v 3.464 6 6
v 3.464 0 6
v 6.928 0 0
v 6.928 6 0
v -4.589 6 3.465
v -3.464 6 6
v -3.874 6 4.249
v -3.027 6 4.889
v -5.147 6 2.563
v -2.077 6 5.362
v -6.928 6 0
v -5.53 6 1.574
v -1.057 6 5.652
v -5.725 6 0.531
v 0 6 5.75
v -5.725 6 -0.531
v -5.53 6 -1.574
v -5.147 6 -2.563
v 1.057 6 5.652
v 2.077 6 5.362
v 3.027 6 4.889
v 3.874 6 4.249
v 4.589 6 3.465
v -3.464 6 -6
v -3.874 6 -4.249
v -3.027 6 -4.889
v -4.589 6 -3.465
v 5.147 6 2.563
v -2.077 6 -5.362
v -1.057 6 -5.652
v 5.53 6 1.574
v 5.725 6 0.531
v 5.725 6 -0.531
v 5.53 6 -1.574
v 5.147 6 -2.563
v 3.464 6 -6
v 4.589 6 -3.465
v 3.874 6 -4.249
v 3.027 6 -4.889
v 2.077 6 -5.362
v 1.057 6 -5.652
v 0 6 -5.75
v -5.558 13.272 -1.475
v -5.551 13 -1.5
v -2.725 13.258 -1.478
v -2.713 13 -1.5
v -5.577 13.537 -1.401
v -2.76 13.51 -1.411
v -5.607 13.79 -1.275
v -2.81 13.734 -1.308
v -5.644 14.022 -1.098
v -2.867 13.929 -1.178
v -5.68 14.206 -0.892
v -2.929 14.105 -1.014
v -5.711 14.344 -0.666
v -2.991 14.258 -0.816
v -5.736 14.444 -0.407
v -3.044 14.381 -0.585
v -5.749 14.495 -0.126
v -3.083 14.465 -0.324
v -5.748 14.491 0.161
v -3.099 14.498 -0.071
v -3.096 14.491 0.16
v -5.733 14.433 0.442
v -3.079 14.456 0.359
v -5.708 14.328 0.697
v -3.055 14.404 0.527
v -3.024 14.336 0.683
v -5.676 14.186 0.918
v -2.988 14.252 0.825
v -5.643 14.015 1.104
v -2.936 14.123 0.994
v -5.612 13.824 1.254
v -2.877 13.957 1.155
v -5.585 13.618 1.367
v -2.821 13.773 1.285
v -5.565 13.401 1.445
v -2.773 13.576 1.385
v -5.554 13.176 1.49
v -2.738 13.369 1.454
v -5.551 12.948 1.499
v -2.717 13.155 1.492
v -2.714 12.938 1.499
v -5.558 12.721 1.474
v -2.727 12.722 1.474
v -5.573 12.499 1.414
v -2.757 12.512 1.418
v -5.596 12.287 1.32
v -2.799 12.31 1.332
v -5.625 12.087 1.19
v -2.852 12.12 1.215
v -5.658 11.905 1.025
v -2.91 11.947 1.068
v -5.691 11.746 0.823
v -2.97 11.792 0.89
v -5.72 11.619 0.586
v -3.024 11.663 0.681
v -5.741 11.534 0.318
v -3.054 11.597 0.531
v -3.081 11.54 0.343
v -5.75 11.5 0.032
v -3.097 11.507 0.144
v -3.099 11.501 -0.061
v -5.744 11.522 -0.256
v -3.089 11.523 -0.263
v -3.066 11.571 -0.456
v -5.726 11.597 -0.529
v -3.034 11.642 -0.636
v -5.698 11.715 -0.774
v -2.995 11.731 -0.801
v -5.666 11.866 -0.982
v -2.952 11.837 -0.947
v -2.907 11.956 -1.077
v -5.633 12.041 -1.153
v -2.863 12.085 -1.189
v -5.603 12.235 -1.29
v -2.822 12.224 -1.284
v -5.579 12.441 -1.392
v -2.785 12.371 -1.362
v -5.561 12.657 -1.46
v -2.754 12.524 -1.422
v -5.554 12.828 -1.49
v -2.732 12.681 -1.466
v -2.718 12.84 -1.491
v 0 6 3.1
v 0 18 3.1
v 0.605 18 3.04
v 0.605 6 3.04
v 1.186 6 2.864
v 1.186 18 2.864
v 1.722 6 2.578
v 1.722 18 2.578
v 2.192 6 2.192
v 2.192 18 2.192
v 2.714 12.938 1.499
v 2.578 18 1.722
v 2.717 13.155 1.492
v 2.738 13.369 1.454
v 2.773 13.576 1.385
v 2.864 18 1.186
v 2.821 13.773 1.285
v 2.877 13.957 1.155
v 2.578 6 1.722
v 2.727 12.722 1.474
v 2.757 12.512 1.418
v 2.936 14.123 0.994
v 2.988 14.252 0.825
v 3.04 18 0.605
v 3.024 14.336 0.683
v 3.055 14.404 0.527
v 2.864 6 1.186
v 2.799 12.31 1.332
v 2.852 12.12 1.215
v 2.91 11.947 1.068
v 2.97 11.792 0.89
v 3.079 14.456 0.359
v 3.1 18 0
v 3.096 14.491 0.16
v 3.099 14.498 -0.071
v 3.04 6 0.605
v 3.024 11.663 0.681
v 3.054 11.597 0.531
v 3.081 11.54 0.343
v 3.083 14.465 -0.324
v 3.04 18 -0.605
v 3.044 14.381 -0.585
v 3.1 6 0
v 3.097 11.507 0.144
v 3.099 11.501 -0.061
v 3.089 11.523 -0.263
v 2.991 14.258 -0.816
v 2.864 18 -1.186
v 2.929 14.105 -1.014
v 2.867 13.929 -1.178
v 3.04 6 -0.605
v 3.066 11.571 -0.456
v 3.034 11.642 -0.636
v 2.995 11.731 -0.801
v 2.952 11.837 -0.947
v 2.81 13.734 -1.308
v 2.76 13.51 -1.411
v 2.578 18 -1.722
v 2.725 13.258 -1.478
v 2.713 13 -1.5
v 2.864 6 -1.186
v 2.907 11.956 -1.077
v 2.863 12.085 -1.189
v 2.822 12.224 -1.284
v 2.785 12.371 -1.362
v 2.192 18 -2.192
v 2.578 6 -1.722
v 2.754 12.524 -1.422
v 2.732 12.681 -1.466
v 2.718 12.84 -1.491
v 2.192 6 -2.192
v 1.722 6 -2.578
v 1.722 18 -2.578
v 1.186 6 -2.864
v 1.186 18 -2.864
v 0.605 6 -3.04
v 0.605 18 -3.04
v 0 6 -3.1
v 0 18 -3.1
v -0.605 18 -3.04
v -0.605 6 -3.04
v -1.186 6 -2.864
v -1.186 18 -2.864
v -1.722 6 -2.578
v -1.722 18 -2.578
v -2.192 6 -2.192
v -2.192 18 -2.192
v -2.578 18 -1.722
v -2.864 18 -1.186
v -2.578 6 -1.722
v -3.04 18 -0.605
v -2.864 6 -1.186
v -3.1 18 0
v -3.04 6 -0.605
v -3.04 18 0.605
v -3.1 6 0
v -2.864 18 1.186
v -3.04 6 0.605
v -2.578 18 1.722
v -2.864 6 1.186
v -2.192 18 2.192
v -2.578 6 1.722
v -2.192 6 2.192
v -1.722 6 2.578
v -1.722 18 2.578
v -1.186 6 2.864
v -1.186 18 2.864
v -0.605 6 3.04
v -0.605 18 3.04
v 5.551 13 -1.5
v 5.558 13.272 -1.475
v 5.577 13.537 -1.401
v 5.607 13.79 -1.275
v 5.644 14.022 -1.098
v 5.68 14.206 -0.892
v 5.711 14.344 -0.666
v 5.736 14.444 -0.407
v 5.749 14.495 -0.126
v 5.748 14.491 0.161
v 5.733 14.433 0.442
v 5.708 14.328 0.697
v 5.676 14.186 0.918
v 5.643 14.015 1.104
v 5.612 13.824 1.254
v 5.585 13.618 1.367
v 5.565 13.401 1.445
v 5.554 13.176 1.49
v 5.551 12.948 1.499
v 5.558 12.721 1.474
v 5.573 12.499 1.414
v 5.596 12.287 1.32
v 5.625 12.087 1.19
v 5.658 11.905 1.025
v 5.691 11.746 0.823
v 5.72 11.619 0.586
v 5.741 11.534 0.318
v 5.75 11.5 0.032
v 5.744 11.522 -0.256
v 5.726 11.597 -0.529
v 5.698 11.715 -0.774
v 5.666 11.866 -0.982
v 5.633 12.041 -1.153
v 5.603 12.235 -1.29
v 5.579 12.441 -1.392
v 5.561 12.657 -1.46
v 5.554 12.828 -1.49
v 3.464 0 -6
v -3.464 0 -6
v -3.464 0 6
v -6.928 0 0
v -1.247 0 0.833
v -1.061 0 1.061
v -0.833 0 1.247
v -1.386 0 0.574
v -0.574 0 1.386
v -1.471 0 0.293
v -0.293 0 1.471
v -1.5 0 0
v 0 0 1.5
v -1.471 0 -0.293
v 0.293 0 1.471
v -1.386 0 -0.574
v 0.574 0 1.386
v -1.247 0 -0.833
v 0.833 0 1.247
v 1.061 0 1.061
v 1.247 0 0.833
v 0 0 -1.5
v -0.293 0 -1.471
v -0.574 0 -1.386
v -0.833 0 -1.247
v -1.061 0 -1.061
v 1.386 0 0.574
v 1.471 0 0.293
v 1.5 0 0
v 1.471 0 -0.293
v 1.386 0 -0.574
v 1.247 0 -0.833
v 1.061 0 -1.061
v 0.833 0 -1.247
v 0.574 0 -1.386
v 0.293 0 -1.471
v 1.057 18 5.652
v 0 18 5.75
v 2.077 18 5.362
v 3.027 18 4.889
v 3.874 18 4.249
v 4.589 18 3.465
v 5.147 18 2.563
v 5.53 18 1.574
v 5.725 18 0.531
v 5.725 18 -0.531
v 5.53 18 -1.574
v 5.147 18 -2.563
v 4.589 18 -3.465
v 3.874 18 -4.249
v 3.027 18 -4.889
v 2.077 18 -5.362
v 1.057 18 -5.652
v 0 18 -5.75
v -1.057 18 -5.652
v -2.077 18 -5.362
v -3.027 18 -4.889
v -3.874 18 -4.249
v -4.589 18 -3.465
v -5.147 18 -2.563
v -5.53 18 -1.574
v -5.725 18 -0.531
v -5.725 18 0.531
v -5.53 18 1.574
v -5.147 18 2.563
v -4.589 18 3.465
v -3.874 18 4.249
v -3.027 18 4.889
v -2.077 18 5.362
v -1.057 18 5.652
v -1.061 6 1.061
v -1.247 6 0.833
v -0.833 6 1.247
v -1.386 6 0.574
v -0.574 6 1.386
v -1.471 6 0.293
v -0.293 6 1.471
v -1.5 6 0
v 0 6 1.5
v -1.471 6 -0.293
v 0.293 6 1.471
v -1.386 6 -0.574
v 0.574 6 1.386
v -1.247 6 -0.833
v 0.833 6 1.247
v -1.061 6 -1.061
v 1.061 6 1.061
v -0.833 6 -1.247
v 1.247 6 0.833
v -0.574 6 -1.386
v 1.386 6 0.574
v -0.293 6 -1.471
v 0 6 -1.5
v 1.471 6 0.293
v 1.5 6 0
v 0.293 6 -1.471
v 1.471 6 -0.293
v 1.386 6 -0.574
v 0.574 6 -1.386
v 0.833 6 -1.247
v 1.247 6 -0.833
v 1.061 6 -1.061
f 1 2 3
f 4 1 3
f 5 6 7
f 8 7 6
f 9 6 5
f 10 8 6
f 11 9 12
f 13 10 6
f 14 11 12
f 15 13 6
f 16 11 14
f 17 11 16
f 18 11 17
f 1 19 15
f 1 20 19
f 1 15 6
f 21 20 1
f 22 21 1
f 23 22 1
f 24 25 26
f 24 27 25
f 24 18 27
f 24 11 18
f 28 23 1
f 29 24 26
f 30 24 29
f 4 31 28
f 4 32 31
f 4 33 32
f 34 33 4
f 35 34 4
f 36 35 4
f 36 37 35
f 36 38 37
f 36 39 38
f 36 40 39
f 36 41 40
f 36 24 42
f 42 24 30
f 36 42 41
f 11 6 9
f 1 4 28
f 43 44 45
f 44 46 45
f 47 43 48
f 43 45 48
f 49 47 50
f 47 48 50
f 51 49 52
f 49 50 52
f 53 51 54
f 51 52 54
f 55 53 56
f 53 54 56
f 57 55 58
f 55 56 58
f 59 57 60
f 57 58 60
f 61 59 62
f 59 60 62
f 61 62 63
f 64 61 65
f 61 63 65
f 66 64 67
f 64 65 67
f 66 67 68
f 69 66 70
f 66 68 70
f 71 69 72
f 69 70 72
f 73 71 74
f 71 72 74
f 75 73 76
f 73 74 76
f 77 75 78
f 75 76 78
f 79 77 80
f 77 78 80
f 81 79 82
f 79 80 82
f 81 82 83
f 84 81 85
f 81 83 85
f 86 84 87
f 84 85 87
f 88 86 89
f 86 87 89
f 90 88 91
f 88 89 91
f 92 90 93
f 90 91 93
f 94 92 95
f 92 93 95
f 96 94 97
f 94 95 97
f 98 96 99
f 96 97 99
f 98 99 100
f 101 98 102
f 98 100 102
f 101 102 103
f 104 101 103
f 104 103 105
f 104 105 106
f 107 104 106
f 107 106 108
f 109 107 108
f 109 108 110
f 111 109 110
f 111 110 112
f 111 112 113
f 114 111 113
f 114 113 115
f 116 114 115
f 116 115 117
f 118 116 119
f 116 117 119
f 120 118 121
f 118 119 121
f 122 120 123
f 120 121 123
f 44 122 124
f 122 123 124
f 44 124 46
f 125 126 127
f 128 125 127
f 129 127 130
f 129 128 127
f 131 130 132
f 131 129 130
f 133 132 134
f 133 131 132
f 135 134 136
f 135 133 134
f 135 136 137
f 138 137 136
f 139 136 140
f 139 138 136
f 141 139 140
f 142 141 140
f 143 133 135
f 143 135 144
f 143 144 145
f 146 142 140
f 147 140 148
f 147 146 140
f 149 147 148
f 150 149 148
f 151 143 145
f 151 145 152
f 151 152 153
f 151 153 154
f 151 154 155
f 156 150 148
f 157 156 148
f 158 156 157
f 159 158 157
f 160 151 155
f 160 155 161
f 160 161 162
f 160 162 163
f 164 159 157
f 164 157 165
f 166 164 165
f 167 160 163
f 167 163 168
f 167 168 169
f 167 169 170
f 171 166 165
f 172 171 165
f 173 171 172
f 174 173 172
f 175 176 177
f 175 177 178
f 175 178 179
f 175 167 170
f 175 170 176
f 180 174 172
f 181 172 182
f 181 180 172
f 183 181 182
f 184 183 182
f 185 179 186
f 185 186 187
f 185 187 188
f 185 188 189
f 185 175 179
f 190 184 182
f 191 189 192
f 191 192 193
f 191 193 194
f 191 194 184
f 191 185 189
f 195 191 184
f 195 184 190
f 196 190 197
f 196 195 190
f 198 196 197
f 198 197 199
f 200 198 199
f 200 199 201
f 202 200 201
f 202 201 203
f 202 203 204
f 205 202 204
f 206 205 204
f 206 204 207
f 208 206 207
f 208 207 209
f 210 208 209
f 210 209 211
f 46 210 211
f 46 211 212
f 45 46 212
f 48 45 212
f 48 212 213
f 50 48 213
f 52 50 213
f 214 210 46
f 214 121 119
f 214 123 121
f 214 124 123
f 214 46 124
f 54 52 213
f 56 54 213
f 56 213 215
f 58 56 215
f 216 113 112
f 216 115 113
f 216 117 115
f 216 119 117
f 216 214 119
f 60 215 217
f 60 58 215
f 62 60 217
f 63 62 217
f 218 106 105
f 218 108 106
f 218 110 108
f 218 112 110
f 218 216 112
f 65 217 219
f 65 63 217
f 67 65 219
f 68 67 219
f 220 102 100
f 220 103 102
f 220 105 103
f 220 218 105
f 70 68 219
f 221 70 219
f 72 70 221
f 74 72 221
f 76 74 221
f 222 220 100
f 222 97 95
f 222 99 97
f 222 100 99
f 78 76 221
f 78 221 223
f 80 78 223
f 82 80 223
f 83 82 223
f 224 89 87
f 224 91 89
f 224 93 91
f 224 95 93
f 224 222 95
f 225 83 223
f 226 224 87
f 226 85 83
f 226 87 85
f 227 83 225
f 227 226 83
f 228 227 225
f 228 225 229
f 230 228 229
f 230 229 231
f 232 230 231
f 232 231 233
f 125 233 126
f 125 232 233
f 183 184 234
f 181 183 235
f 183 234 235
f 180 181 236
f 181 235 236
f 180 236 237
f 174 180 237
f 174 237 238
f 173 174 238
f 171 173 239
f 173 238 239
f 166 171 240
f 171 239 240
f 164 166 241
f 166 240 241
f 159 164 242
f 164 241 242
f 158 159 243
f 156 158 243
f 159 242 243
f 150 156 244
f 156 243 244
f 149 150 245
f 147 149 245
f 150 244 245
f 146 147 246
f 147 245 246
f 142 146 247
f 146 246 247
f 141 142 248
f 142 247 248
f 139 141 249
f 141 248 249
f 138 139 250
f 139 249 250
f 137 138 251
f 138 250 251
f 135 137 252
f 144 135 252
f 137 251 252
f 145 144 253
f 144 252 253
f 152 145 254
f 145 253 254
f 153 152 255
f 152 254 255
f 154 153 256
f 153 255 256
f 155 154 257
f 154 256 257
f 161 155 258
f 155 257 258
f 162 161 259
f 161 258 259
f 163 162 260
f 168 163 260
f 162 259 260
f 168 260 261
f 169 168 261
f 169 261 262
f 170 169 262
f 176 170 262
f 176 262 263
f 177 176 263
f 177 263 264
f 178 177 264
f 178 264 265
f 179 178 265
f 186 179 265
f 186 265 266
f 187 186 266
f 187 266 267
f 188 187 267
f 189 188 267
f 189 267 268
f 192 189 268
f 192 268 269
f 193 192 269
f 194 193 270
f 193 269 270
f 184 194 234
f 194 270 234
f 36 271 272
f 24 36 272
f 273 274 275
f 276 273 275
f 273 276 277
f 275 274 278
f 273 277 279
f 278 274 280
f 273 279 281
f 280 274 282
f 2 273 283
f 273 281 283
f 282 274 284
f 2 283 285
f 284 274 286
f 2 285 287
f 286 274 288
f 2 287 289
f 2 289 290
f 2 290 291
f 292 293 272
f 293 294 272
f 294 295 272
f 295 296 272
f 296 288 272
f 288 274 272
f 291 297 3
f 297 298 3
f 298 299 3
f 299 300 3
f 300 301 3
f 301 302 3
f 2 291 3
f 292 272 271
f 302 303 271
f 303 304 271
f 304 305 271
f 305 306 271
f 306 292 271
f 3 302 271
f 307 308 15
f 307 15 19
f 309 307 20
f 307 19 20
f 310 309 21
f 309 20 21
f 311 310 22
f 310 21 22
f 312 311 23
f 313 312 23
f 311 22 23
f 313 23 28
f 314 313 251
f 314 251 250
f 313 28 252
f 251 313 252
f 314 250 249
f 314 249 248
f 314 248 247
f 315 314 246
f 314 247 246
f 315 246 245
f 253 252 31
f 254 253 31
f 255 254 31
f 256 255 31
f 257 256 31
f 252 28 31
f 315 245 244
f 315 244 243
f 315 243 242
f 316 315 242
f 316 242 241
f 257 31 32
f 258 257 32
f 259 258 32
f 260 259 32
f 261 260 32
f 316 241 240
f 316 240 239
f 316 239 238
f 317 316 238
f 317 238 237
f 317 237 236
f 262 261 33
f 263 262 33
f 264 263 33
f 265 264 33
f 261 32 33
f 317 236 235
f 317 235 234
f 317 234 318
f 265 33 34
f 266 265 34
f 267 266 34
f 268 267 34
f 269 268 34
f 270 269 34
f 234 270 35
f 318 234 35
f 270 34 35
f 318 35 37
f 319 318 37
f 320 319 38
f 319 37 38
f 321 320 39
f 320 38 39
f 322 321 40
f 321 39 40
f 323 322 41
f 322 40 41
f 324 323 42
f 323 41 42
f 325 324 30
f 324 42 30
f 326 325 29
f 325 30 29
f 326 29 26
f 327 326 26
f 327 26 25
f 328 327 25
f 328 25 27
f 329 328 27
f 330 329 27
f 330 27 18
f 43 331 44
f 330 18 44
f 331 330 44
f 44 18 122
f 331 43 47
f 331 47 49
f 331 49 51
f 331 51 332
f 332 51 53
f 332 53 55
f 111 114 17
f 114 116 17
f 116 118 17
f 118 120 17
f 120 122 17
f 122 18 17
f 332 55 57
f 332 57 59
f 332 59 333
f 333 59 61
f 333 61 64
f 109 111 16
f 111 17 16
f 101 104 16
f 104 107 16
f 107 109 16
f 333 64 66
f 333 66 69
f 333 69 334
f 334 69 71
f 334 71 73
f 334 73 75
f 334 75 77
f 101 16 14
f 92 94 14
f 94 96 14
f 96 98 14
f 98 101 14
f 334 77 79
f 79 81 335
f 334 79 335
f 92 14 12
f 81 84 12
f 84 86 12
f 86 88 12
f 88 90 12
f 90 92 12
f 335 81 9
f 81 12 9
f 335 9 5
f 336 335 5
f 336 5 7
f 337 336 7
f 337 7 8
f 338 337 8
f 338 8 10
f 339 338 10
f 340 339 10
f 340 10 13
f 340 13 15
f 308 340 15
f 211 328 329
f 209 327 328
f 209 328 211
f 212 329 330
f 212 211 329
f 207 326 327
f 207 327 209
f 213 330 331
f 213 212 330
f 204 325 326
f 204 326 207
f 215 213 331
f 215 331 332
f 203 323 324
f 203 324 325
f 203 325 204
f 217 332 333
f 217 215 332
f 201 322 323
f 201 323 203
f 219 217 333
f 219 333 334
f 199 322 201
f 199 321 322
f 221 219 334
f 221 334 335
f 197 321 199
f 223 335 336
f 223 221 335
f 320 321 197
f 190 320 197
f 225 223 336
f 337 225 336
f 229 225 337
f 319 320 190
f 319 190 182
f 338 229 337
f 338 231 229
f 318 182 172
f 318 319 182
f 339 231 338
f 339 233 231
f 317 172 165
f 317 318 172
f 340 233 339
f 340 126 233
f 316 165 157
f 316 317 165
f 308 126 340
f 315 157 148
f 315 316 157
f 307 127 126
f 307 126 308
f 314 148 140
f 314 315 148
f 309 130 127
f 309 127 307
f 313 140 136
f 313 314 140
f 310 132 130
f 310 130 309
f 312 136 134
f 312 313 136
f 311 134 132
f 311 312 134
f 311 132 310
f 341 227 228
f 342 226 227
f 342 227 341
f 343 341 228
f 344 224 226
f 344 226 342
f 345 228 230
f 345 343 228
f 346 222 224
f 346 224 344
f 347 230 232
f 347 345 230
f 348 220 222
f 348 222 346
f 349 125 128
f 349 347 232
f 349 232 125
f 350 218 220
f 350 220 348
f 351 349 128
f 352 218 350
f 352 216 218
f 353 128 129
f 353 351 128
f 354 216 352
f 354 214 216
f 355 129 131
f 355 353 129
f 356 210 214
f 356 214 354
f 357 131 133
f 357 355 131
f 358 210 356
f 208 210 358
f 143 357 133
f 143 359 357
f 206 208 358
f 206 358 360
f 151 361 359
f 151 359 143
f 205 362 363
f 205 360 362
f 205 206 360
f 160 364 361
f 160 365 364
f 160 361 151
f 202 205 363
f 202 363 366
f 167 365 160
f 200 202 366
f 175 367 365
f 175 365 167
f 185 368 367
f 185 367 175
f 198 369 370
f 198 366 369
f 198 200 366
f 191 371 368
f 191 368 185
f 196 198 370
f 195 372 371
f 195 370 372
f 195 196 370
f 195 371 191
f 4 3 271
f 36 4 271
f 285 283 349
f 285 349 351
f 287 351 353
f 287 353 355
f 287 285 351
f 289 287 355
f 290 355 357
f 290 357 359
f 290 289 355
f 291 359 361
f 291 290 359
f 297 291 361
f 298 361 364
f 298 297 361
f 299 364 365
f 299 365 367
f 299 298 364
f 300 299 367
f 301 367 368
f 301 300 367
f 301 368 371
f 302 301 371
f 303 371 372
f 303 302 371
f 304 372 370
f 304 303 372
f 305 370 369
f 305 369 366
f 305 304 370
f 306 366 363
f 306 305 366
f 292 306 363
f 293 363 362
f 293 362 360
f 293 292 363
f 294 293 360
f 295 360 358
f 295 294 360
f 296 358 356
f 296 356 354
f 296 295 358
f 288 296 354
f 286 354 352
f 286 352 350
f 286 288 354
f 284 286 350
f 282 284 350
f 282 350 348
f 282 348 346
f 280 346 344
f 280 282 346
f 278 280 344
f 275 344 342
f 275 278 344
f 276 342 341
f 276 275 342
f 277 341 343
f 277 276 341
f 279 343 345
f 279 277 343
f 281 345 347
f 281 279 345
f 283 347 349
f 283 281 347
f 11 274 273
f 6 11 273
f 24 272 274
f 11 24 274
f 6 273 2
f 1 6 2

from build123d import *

# Parameters (mm, degrees)
SKETCH1_R           = 1.5
BOSS_EXTRUDE1_DEPTH = 6
SKETCH2_R           = 5.75
SKETCH2_R_2         = 3.1
BOSS_EXTRUDE2_DEPTH = 12
SKETCH3_R           = 1.5
CUT_EXTRUDE1_DEPTH  = 6


with BuildPart() as part:
    # Sketch1 → Boss-Extrude1 (new body)
    with BuildSketch(Plane(origin=(0, 0, 0), x_dir=(1, 0, 0), z_dir=(0, 1, 0))):
        Polygon((6.92820323, 0), (3.464101615, 6), (-3.464101615, 6), (-6.92820323, 0), (-3.464101615, -6), (3.464101615, -6), align=None)
        with Locations(Location((0, 0, 0), (0, 0, 270))):
            Circle(SKETCH1_R, mode=Mode.SUBTRACT)
    extrude(amount=BOSS_EXTRUDE1_DEPTH)

    # Sketch2 → Boss-Extrude2 (add)
    with BuildSketch(Plane(origin=(0, 6, 0), x_dir=(1, 0, 0), z_dir=(0, 1, 0))):
        with Locations(Location((0, 0, 0), (0, 0, 270))):
            Circle(SKETCH2_R)
        with Locations(Location((0, 0, 0), (0, 0, 270))):
            Circle(SKETCH2_R_2, mode=Mode.SUBTRACT)
    extrude(amount=BOSS_EXTRUDE2_DEPTH)

    # Sketch3 → Cut-Extrude1 (cut, symmetric)
    with BuildSketch(Plane(origin=(0, 0, 0), x_dir=(0, 0, -1), z_dir=(1, 0, 0))):
        with Locations((0, 13)):
            Circle(SKETCH3_R)
    extrude(amount=CUT_EXTRUDE1_DEPTH, both=True, mode=Mode.SUBTRACT)


solid = part.part
